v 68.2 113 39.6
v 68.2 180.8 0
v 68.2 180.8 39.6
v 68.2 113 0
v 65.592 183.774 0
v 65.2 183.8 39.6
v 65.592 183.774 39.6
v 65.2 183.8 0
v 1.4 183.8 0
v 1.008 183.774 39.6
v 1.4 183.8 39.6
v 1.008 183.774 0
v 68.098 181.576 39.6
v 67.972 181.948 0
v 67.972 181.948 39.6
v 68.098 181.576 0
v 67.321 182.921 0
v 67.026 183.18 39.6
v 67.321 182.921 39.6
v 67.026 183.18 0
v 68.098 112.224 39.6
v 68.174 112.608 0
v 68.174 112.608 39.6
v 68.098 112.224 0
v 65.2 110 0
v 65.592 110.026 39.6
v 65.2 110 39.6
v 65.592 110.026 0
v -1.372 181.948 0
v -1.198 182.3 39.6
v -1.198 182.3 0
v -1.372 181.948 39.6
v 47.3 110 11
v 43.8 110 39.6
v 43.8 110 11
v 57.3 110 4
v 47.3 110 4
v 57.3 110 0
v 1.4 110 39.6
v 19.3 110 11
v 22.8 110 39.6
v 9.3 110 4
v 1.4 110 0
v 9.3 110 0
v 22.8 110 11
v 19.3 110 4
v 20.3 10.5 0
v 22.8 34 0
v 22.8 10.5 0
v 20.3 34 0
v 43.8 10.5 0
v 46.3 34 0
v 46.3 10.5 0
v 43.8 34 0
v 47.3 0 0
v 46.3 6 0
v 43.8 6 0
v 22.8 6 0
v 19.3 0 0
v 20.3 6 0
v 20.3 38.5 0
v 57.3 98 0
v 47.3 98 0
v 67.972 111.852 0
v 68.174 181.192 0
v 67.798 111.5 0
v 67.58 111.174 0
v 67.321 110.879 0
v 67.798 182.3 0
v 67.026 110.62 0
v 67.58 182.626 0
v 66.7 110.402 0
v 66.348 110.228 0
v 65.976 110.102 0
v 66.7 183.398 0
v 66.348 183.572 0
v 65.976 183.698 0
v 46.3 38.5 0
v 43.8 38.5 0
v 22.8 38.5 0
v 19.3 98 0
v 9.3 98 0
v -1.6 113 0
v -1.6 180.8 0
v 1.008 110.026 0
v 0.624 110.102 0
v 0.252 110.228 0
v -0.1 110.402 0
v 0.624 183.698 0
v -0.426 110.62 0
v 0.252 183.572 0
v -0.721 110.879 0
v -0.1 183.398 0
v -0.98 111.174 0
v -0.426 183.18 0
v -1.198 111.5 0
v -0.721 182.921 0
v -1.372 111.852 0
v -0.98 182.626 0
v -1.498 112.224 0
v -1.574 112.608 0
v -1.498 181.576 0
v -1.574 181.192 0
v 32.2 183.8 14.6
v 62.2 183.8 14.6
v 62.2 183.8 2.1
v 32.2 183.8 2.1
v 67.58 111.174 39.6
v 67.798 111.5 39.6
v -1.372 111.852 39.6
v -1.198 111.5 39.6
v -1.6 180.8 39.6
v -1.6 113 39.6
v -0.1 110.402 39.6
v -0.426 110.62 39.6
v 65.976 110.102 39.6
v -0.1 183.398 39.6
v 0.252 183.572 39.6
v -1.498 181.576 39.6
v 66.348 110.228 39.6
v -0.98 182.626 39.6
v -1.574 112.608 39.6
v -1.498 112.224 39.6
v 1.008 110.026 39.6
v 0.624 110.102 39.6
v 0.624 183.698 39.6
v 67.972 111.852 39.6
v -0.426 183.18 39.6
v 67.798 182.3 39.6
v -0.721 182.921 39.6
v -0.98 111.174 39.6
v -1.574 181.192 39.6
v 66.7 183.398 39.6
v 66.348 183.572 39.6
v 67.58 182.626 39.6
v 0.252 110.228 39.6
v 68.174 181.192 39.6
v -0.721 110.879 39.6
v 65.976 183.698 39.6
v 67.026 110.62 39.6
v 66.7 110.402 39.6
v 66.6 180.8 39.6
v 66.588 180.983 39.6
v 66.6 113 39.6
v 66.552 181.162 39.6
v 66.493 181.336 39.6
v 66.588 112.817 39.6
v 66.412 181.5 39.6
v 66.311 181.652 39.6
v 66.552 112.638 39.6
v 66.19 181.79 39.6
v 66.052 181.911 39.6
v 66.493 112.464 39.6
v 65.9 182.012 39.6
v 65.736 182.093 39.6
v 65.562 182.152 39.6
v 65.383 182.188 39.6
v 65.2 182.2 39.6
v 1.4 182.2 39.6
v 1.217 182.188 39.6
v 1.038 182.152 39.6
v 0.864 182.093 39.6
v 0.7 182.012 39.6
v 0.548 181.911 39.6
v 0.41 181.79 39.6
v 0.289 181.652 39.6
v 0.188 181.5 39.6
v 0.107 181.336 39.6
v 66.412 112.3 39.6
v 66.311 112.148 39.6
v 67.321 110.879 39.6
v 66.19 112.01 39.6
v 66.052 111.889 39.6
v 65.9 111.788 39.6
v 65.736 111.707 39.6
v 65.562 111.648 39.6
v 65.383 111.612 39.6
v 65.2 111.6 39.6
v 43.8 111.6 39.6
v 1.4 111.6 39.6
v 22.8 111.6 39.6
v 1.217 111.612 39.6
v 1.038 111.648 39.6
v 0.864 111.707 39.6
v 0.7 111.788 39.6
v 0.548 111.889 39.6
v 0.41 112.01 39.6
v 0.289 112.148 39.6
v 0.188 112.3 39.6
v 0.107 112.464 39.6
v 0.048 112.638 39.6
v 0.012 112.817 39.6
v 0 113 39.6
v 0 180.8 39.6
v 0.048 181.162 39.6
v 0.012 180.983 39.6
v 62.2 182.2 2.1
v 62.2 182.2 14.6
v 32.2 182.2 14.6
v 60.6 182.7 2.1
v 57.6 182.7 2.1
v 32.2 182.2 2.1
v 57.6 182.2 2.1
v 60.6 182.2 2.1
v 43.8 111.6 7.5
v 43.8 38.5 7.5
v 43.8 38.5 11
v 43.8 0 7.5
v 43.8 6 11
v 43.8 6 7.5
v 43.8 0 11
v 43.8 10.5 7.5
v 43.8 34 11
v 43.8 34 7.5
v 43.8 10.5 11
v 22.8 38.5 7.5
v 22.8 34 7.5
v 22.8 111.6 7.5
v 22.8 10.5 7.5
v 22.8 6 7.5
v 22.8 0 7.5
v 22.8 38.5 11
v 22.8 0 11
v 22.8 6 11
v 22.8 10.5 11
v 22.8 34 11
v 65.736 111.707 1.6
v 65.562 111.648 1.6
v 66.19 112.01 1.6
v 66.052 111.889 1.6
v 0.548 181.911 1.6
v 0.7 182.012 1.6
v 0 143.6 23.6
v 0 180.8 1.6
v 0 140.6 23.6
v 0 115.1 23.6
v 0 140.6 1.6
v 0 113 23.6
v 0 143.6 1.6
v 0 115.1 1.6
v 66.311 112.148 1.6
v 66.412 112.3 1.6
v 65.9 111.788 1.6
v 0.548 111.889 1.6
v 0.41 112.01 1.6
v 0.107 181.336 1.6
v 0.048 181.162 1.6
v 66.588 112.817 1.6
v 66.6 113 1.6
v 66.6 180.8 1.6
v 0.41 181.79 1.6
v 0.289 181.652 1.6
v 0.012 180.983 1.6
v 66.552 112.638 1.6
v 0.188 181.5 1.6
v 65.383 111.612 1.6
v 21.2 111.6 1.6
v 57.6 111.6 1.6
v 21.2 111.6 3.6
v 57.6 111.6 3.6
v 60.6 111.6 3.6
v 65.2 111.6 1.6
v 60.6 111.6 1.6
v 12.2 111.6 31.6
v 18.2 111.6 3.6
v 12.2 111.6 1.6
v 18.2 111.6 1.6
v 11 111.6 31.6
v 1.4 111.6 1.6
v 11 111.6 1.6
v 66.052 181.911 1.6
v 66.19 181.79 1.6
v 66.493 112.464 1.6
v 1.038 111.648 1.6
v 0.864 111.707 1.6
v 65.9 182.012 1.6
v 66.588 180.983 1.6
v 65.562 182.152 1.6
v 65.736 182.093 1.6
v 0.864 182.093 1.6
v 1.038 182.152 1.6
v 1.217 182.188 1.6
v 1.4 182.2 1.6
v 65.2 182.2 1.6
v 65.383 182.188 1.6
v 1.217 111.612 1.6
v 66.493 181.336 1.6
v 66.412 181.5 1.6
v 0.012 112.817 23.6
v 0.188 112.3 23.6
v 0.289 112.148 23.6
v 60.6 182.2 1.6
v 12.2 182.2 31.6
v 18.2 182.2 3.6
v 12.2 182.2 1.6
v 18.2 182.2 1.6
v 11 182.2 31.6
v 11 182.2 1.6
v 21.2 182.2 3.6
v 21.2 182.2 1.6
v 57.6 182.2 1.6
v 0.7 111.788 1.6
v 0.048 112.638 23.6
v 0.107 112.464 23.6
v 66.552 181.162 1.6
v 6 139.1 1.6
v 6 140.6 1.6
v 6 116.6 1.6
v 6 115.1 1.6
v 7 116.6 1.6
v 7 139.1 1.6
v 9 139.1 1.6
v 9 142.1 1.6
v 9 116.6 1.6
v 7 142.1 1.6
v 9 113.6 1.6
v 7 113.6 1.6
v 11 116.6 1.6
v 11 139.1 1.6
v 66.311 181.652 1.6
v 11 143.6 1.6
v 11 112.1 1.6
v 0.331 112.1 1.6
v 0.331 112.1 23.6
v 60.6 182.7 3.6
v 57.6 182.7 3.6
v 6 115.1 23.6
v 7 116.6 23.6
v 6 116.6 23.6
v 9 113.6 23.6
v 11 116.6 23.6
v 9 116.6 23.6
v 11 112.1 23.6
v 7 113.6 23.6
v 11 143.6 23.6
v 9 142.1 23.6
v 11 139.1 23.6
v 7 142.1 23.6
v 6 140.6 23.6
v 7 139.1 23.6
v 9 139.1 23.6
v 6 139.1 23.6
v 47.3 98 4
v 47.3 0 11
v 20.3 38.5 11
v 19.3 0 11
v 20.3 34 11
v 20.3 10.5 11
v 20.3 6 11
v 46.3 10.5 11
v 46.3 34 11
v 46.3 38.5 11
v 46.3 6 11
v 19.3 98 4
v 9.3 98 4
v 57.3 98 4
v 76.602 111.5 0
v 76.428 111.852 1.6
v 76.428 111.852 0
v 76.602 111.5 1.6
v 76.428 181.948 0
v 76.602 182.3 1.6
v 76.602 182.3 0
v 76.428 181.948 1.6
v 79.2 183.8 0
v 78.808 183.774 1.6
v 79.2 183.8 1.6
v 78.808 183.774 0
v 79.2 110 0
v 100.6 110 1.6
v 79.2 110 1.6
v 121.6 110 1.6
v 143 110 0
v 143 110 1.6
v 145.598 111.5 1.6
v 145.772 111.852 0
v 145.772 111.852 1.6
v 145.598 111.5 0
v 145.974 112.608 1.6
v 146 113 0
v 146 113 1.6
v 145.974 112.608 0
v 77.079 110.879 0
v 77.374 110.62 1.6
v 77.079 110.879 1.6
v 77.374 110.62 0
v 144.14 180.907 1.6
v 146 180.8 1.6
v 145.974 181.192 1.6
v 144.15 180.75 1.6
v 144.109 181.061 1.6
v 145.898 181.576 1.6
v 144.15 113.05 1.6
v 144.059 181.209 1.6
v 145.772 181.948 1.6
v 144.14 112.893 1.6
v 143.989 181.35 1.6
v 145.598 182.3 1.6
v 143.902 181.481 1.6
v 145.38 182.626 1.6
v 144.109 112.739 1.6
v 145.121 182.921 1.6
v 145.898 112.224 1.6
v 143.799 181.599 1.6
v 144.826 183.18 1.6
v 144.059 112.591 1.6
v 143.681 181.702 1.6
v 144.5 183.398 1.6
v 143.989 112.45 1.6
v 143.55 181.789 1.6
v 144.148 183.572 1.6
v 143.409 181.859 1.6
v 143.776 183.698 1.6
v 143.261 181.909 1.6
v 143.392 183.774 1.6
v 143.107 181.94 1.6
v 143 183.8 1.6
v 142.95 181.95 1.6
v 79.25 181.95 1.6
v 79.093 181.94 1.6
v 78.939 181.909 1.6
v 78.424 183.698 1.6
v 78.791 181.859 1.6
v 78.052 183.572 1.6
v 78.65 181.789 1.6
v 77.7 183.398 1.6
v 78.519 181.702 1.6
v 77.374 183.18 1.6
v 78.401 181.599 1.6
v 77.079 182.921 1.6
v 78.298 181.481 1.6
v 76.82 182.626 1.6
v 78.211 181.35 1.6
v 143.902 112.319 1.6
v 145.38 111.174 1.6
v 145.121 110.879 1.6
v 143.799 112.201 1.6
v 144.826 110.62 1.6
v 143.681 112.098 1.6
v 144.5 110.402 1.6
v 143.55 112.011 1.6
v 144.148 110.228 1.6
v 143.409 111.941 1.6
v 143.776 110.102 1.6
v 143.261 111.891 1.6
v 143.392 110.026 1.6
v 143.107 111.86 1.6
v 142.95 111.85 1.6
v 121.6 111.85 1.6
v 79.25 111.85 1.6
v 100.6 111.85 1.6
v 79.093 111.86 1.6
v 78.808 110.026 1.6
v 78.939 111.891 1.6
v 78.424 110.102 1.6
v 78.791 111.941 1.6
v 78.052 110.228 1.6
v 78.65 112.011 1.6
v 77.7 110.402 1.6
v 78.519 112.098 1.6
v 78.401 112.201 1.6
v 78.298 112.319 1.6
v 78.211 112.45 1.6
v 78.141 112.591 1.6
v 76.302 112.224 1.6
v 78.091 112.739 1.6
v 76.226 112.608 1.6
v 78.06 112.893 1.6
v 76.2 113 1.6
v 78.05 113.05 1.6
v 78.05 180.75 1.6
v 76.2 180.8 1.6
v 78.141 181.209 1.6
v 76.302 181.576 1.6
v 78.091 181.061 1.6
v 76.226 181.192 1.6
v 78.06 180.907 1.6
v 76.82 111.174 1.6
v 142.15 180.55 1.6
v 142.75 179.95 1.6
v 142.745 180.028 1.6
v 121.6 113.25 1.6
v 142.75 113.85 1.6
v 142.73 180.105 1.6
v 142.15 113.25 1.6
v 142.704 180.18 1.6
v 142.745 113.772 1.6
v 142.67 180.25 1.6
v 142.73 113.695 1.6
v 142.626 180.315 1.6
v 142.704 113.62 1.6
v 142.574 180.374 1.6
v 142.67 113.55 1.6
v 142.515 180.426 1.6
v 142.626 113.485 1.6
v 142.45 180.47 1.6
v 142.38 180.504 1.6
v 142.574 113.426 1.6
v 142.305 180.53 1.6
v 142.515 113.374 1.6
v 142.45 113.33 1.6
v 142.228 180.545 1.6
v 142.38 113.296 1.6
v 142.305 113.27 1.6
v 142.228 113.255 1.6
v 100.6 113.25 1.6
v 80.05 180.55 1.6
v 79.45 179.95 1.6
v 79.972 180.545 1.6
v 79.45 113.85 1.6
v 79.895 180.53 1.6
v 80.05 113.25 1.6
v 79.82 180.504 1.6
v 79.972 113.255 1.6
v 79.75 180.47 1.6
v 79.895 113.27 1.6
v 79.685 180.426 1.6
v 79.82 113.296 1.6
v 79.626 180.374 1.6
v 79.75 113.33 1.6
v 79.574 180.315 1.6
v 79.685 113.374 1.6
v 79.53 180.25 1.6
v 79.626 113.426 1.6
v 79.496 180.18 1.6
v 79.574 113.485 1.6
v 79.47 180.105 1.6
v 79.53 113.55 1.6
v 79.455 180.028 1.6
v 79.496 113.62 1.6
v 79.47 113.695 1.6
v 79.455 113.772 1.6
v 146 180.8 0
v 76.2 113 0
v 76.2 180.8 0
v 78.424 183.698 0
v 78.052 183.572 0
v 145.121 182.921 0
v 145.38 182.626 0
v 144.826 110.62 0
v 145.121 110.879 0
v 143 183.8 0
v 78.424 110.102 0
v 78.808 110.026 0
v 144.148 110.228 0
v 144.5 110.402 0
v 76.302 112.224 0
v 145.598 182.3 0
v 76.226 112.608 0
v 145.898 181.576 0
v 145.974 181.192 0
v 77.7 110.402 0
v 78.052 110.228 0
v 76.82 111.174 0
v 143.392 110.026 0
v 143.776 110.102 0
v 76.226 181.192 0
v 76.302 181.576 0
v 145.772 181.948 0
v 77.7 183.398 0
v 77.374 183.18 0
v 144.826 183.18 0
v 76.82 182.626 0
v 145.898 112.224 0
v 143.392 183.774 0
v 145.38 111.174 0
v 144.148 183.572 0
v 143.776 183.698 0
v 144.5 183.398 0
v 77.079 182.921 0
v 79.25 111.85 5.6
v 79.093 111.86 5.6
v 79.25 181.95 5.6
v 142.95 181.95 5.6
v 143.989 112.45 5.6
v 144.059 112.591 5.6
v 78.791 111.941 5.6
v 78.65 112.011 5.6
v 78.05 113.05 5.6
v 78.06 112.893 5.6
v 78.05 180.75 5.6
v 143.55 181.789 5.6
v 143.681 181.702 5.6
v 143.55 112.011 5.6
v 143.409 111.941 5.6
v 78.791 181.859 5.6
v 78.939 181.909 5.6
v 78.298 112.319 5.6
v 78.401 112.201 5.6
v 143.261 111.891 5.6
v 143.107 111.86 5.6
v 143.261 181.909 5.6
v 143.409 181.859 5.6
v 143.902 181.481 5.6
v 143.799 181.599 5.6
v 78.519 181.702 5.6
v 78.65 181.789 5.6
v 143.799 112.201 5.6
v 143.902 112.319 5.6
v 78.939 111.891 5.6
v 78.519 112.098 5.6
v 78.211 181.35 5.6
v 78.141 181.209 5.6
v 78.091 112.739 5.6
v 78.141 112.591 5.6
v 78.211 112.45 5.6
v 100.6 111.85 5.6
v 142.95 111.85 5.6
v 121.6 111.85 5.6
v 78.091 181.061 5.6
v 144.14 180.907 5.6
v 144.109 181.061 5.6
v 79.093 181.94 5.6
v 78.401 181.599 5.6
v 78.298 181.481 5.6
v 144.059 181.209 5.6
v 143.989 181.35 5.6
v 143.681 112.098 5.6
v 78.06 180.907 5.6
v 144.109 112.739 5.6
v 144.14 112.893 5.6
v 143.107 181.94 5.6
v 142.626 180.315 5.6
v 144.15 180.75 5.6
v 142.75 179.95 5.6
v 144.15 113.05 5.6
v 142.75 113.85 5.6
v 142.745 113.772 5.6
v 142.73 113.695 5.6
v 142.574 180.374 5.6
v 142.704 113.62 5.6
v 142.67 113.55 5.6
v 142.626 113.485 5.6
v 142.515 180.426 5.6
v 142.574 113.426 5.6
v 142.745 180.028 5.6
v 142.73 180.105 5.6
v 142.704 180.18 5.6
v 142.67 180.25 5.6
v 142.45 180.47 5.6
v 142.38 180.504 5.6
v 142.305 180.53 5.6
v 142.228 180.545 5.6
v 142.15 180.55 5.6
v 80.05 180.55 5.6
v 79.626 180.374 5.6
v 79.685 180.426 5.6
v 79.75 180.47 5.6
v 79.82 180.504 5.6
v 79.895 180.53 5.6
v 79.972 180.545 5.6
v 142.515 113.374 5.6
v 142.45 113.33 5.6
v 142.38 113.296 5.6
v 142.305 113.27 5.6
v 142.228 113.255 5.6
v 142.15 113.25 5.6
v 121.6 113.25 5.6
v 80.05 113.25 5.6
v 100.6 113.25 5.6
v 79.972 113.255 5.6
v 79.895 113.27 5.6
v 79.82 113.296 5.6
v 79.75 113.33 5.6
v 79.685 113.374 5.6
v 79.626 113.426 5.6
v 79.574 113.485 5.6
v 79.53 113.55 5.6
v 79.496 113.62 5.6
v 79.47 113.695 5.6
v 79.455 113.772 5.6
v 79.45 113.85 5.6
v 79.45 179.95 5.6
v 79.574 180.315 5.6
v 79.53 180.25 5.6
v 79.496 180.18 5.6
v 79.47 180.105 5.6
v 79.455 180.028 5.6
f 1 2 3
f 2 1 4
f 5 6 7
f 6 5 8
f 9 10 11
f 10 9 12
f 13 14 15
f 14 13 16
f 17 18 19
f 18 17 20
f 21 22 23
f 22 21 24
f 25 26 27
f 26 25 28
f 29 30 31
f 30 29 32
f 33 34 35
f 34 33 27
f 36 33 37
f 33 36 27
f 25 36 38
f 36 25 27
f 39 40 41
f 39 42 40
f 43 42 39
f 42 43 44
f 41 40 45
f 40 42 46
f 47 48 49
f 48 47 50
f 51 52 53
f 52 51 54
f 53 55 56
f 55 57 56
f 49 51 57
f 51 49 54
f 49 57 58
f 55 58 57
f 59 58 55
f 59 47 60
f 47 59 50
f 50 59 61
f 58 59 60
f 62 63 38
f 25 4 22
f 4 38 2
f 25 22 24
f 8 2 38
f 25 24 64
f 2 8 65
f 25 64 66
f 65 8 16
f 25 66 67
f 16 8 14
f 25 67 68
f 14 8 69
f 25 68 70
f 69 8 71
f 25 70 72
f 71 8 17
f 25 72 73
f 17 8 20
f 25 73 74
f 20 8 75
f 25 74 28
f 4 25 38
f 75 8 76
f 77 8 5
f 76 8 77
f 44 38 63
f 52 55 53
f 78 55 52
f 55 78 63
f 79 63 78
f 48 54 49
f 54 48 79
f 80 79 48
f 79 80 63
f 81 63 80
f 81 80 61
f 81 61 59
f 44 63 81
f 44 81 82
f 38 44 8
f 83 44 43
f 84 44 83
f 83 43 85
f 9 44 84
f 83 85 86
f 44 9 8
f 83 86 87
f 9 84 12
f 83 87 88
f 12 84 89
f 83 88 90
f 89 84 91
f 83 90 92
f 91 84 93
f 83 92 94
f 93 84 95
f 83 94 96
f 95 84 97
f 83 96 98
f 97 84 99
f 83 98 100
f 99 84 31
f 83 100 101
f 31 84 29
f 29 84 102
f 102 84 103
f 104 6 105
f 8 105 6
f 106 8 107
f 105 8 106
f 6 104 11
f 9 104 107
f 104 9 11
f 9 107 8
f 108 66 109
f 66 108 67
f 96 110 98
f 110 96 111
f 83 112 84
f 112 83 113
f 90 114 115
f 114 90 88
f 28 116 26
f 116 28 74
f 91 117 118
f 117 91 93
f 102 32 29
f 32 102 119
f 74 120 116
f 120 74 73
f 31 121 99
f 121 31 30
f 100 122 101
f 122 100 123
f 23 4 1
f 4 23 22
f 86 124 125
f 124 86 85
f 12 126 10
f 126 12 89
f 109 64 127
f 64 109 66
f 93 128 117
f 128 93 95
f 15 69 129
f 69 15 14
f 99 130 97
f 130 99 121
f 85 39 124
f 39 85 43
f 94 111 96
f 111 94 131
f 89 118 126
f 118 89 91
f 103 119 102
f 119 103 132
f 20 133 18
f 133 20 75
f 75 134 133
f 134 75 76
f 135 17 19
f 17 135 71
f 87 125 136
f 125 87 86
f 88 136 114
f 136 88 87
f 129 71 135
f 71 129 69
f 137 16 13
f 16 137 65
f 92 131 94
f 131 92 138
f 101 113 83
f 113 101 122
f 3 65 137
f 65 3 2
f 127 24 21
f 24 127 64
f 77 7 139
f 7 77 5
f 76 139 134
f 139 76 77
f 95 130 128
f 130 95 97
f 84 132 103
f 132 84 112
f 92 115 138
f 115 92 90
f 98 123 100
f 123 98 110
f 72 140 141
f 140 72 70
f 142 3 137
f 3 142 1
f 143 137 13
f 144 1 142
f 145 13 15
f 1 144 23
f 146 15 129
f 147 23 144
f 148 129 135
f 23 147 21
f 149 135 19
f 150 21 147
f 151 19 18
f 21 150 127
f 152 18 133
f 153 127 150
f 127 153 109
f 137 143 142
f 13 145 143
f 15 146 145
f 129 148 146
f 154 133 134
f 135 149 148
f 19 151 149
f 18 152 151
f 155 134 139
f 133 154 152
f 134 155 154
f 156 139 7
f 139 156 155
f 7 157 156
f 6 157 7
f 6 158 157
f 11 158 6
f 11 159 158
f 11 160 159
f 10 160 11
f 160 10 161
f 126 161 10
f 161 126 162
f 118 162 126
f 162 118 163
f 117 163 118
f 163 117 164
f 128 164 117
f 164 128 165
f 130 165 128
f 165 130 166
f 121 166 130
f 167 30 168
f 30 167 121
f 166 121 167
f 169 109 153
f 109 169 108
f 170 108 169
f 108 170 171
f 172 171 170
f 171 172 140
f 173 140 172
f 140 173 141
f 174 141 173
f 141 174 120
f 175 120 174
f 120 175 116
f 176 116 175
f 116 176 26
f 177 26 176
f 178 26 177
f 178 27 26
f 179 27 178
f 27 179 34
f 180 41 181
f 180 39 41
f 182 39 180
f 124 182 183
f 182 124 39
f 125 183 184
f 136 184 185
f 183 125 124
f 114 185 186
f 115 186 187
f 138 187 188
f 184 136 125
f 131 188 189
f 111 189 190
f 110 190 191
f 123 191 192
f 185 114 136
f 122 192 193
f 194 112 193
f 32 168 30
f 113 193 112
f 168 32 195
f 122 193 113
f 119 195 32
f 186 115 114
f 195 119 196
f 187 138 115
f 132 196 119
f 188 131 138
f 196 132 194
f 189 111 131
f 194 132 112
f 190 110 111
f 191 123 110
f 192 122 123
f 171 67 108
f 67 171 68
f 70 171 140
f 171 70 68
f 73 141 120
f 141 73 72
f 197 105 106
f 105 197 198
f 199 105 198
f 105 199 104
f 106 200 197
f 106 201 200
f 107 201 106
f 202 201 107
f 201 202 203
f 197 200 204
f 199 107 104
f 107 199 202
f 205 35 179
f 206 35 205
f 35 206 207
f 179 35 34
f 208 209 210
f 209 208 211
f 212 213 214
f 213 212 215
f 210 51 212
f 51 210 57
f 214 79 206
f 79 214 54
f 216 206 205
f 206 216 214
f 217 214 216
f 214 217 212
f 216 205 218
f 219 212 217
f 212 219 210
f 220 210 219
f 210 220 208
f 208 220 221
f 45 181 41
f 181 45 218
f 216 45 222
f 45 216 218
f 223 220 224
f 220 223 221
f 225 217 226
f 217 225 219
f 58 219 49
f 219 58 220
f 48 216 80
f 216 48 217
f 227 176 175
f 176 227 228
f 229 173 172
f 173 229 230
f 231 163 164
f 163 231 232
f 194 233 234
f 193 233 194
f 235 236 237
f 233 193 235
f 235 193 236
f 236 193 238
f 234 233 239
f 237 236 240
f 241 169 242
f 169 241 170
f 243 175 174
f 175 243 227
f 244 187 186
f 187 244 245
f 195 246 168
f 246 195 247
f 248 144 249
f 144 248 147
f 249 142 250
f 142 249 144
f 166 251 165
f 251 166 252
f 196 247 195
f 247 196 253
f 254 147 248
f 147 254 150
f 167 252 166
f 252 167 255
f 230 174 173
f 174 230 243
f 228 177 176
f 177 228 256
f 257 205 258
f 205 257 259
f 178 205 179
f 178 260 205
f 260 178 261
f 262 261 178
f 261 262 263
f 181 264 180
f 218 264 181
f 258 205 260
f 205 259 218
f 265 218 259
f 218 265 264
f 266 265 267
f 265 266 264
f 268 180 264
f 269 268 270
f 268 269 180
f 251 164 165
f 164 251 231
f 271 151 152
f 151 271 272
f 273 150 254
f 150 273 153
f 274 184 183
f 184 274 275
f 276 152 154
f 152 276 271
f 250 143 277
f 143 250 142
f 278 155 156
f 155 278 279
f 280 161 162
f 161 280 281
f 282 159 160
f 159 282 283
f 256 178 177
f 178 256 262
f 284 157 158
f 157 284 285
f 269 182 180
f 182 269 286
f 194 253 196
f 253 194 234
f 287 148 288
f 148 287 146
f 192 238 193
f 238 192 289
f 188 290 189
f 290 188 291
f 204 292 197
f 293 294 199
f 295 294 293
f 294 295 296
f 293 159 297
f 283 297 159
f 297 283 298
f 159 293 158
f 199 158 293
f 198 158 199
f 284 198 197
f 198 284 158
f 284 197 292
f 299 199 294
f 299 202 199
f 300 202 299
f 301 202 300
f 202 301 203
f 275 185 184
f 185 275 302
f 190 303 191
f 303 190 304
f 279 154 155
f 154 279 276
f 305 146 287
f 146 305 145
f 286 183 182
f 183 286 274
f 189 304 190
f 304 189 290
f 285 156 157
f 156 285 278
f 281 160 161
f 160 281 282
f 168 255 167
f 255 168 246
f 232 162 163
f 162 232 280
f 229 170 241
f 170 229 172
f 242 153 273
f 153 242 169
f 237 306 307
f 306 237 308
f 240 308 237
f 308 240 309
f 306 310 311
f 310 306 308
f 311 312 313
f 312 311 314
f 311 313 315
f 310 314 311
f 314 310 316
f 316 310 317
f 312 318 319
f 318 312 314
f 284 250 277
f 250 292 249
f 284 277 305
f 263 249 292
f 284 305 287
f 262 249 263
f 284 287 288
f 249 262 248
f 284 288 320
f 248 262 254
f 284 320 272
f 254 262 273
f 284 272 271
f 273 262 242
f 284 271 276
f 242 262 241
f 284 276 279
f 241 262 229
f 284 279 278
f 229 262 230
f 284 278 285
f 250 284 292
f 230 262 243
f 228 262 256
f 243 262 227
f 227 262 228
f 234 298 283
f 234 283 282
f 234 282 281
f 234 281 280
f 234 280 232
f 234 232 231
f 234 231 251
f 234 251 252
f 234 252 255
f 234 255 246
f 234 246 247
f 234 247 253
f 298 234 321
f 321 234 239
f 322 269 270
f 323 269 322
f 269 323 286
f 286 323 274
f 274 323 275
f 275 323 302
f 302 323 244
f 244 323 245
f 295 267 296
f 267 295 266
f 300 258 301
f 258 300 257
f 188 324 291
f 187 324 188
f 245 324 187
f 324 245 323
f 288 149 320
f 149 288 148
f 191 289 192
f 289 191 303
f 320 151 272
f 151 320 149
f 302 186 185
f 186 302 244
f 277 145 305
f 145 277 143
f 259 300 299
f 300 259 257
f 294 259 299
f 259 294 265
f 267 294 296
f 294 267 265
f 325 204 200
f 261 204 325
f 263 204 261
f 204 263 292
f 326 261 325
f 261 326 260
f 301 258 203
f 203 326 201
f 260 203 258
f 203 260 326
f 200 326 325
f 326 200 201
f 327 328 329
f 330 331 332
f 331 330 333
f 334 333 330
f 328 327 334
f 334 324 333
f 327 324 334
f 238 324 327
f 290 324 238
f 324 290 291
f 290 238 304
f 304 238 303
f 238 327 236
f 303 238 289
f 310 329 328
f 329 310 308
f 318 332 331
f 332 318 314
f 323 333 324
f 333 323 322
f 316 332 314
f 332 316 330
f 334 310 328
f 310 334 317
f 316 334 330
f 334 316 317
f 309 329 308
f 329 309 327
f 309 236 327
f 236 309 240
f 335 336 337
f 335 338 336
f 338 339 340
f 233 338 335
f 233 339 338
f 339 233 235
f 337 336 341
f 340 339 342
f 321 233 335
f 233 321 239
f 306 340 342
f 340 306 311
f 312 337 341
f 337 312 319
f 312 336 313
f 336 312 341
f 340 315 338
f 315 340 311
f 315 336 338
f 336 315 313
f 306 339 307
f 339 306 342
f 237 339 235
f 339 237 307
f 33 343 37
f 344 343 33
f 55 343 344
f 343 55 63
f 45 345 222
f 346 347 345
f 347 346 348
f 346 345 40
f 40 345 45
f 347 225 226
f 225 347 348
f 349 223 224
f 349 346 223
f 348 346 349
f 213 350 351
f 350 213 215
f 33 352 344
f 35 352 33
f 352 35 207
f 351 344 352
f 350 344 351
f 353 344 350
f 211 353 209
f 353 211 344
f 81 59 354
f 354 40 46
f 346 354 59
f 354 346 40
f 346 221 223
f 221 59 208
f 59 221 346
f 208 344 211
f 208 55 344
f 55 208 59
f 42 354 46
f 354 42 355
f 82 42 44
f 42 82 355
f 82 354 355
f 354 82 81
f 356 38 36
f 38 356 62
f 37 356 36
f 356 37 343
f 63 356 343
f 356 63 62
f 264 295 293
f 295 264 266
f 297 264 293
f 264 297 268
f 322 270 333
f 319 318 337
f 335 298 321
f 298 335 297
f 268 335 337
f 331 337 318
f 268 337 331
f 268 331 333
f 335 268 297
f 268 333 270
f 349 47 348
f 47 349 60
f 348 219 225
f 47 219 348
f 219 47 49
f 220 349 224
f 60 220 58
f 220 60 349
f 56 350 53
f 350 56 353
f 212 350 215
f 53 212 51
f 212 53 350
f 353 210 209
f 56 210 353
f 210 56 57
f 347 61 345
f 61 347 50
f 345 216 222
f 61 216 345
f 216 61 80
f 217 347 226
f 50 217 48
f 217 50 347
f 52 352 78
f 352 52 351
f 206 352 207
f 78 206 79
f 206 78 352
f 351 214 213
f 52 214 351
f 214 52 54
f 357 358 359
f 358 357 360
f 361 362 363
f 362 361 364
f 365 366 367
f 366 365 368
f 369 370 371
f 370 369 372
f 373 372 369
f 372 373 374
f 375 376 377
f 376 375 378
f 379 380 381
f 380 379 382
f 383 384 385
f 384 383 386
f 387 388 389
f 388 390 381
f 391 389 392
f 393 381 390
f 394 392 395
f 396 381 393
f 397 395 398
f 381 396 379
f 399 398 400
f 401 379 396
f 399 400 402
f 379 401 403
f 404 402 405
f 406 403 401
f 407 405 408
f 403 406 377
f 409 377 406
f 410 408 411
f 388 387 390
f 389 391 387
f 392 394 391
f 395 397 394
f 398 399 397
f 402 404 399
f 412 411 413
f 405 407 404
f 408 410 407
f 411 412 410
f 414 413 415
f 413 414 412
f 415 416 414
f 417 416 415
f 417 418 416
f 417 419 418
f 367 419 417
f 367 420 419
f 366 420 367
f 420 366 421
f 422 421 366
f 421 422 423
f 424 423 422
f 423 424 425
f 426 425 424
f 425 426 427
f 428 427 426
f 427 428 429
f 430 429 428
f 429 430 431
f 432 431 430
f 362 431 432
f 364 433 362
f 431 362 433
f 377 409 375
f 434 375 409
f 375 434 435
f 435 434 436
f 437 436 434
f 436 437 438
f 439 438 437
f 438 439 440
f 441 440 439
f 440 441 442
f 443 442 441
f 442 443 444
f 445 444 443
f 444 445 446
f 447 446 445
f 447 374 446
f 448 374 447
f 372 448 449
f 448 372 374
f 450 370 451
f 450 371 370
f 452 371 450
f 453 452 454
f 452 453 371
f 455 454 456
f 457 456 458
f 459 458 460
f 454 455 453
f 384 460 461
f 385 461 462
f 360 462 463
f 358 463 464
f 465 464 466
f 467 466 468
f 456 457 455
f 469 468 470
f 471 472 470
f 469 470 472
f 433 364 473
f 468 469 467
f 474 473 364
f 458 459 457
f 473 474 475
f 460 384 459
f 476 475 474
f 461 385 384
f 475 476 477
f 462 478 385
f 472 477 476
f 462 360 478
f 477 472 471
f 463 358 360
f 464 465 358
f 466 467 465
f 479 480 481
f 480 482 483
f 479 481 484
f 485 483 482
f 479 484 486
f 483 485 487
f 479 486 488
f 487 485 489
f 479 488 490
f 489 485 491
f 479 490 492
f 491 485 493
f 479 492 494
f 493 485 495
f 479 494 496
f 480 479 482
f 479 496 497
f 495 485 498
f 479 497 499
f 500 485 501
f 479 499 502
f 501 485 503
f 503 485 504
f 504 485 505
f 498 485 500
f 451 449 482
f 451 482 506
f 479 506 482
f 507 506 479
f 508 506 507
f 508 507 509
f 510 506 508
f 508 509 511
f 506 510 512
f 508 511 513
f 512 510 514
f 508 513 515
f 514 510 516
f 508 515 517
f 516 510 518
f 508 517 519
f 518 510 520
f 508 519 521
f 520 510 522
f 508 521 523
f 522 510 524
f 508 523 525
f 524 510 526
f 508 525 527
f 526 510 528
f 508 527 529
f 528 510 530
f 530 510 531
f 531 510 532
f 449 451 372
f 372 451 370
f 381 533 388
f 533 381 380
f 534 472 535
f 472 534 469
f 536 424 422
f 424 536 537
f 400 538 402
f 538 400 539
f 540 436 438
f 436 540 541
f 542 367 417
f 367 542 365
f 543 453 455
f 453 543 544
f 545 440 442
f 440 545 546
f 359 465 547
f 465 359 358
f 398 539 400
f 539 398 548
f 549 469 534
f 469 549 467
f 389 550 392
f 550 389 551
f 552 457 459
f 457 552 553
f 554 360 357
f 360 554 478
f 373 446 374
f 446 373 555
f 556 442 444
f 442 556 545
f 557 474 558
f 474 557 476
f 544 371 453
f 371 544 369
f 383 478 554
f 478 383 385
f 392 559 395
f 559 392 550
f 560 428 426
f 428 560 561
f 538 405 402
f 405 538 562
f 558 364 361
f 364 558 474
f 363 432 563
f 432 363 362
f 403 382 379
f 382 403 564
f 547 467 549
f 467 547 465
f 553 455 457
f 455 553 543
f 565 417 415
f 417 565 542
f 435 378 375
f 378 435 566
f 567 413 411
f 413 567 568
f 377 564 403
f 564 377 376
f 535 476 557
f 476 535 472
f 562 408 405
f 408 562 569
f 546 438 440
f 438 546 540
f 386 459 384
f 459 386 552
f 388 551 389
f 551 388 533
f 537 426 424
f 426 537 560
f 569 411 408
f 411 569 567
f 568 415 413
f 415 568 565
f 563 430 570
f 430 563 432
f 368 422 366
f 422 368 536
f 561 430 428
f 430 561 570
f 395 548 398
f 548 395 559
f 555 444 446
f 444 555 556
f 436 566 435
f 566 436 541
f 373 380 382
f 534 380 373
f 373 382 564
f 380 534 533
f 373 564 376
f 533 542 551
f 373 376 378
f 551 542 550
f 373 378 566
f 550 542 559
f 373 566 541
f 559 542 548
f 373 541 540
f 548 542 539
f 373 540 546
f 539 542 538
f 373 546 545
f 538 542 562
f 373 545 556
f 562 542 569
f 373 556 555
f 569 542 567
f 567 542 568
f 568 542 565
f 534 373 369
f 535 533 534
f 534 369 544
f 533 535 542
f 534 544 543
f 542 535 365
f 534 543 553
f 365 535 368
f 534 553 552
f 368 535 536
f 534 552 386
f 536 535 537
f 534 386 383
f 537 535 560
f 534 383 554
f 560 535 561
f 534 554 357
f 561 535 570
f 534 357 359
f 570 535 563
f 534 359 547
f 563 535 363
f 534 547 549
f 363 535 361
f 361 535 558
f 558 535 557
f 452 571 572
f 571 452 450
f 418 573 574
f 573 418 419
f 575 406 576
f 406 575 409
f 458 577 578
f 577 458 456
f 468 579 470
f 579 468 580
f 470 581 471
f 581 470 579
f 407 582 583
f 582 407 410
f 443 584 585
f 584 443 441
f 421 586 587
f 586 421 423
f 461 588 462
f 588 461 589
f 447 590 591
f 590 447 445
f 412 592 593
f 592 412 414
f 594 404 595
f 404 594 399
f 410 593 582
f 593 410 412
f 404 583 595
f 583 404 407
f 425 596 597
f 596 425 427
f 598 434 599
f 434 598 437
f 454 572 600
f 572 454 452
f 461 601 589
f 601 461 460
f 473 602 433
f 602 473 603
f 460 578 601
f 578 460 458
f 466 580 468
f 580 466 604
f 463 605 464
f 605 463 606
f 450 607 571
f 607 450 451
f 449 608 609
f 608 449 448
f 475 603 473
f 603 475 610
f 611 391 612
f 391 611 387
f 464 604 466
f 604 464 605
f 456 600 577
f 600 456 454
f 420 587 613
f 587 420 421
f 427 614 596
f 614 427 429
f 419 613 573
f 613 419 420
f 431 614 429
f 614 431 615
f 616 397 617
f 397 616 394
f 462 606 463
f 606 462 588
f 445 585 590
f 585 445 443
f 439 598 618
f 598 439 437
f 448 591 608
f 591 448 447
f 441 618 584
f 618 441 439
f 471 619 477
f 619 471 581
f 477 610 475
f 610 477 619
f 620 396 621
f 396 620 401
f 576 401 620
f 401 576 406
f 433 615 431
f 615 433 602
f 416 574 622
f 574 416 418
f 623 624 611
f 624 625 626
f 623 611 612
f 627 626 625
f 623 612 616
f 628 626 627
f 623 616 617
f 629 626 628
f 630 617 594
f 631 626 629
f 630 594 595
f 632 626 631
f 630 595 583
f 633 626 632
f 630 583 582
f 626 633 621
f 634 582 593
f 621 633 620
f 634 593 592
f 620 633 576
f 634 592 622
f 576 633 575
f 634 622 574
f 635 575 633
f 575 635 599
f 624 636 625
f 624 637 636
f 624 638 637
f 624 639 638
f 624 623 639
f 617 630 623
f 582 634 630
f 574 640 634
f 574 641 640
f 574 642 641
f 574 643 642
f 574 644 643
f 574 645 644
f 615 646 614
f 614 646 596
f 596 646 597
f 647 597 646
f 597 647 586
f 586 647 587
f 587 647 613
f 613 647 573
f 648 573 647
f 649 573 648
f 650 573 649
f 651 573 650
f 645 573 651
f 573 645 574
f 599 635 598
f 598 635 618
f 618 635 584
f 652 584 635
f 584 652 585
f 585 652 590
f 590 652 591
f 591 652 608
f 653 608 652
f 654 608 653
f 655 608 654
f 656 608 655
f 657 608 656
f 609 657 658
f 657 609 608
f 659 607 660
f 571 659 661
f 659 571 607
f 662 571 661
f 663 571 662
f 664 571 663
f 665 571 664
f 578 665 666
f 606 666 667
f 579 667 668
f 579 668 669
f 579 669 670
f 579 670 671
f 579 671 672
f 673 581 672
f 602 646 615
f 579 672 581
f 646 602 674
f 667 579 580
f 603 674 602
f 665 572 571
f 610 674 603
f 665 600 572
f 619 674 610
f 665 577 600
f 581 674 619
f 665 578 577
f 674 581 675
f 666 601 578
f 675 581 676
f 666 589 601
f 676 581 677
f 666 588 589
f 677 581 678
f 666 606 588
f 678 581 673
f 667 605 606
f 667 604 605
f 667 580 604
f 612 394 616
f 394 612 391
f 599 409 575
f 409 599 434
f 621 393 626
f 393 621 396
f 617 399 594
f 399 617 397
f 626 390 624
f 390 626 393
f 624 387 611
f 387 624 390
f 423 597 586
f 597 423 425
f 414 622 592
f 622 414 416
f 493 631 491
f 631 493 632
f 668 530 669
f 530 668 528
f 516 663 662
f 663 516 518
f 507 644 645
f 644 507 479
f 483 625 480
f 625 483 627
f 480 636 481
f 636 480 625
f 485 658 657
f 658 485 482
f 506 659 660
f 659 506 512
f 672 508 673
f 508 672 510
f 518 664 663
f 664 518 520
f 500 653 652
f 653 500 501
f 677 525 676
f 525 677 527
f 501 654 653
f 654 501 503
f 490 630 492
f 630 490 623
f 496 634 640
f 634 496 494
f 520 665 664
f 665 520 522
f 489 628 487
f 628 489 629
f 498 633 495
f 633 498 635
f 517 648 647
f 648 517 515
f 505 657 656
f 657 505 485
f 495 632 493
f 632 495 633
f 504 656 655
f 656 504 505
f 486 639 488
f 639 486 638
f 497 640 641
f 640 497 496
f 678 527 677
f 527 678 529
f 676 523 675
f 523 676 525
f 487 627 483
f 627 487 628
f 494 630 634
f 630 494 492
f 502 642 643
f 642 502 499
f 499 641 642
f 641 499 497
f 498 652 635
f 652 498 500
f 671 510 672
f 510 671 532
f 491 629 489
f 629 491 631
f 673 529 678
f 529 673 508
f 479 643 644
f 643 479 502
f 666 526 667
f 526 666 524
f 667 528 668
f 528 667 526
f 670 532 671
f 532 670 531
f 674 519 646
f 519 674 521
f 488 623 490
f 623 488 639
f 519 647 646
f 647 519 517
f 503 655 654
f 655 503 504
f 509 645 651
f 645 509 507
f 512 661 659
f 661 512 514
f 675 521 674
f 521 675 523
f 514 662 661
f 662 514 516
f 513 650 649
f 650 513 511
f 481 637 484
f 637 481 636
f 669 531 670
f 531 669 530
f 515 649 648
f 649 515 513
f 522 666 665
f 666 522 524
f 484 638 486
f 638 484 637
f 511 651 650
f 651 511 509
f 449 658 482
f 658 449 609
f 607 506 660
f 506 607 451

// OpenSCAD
// SlopeCast stake enclosure
// Upright stake: moisture sensor clamped in a groove at the bottom of the shaft, Uno (+ Grove
// Base Shield) in a housing held off the ground, Grove accelerometer in a slot on the
// housing's inside wall. Prints lying on its back with no supports.
//
// Coordinates as printed: x across, y along the stake (y = 0 is the tip), z up from the bed.
// Units: mm. Change the measured values below, then F6 and File > Export > STL.
// Set PART to "stake", "lid" or "plate" (both, side by side) before exporting.
//
// Mirrors the Python generator used to make hardware/stl/*.stl; keep the two in step
// (see print-notes.md).

PART = "plate";
$fn = 48;

// ---------- measured parts (edit these)
UNO_W = 54.4;          // pocket width: stock Uno PCB is 53.4 (set 51.0 if yours really is 50)
UNO_L = 70.6;          // pocket length along the stake: PCB 68.6 + USB-C + clearance
UNO_RIB_H = 2.0;       // ribs keep solder pins off the back plate
ACC_L = 25.0;          // accelerometer edge along the stake
ACC_D = 20.0;          // accelerometer edge that slides in toward the back plate
ACC_CLEAR = 0.5;       // play along ACC_L
SENSOR_W = 20.0;       // moisture sensor PCB width

// ---------- walls and fits
W = 1.6;               // wall
BACK = 1.6;            // back plate (on the bed)
GROOVE_W = 2.0;        // accelerometer PCB groove: 1.6 mm board + 0.4
GROOVE_X = 7.0;        // groove distance from the side wall (room for the Grove connector)
GROOVE_DEPTH = 1.5;    // how far each board edge sits in its rail
COMP_W = 11.0;         // accelerometer compartment width
DIV_T = 1.2;           // divider between compartment and Uno pocket
IN_Z = 38.0;           // housing inside depth: Uno 25 + Grove plugs
SHAFT_L = 110.0;       // tip to housing
SHAFT_W = 28.0;
SHAFT_T = 11.0;
GROOVE_SW = SENSOR_W + 1.0;   // sensor groove width (also carries the Grove cable)
GROOVE_SD = 3.5;              // sensor groove depth
USB_X0 = 20.0; USB_X1 = 50.0; // USB-C opening, from the board's left edge (USB edge up)
USB_Z0 = 0.5;  USB_Z1 = 13.0; // above the inside of the back plate
LID_T = 1.6; LIP_H = 4.0; LIP_W = 1.4; LID_CLEAR = 0.25;

// ---------- derived
IN_X = COMP_W + DIV_T + UNO_W;
IN_Y = UNO_L;
HX0 = 0; HY0 = SHAFT_L + W; HZ0 = BACK;
OX0 = HX0 - W; OX1 = HX0 + IN_X + W;
OY0 = SHAFT_L; OY1 = HY0 + IN_Y + W;
OZ1 = HZ0 + IN_Z;
CX = (OX0 + OX1) / 2;
UNO_X0 = HX0 + COMP_W + DIV_T;

module box(x0, y0, z0, x1, y1, z1) {
    translate([x0, y0, z0]) cube([x1 - x0, y1 - y0, z1 - z0]);
}

module rbox(x0, y0, z0, x1, y1, z1, r) {
    hull() for (x = [x0 + r, x1 - r], y = [y0 + r, y1 - r])
        translate([x, y, z0]) cylinder(r = r, h = z1 - z0);
}

module accel_rails() {
    ya = HY0 + 3.5;                    // lower board edge
    yb = ya + ACC_L + ACC_CLEAR;       // upper board edge
    gx0 = HX0 + GROOVE_X; gx1 = gx0 + GROOVE_W;
    rz1 = HZ0 + ACC_D + 2;
    difference() {
        box(HX0 - 0.5, ya - 3, HZ0 - 0.5, HX0 + COMP_W + 0.5, ya + GROOVE_DEPTH, rz1);
        box(gx0, ya - GROOVE_DEPTH, HZ0, gx1, ya + GROOVE_DEPTH + 1, rz1 + 1);
        box(HX0 - 1, ya, HZ0, gx0 - 1.0, ya + GROOVE_DEPTH + 1, rz1 + 1);
    }
    difference() {
        box(HX0 - 0.5, yb - GROOVE_DEPTH, HZ0 - 0.5, HX0 + COMP_W + 0.5, yb + 3, rz1);
        box(gx0, yb - GROOVE_DEPTH - 1, HZ0, gx1, yb + GROOVE_DEPTH, rz1 + 1);
        box(HX0 - 1, yb - GROOVE_DEPTH - 1, HZ0, gx0 - 1.0, yb, rz1 + 1);
    }
}

module stake() {
    difference() {
        union() {
            // housing shell with USB-C opening (top wall) and cable notch (floor, open to the front)
            difference() {
                rbox(OX0, OY0, 0, OX1, OY1, OZ1, 3.0);
                box(UNO_X0 + USB_X0, OY1 - W - 1, HZ0 + USB_Z0, UNO_X0 + USB_X1, OY1 + 1, HZ0 + USB_Z1);
                box(CX - GROOVE_SW / 2, OY0 - 1, SHAFT_T - GROOVE_SD, CX + GROOVE_SW / 2, HY0 + 1, OZ1 + 1);
                rbox(HX0, HY0, HZ0, HX0 + IN_X, HY0 + IN_Y, OZ1 + 1, 1.4);
            }
            // shaft, overlapping into the housing floor
            box(CX - SHAFT_W / 2, 0, 0, CX + SHAFT_W / 2, OY0 + W * 0.5, SHAFT_T);
            // gussets where shaft meets housing
            box(CX - SHAFT_W / 2 - 10, OY0 - 12, 0, CX - SHAFT_W / 2, OY0 + 0.5, 4);
            box(CX + SHAFT_W / 2, OY0 - 12, 0, CX + SHAFT_W / 2 + 10, OY0 + 0.5, 4);
            // divider between accelerometer compartment and Uno pocket
            box(HX0 + COMP_W, HY0 - 0.5, HZ0 - 0.5, HX0 + COMP_W + DIV_T, HY0 + IN_Y + 0.5, HZ0 + 30);
            // ribs under the Uno
            for (rx = [UNO_X0 + 6, UNO_X0 + UNO_W - 9])
                box(rx, HY0 - 0.5, HZ0 - 0.5, rx + 3, HY0 + IN_Y + 0.5, HZ0 + UNO_RIB_H);
            accel_rails();
        }
        // sensor + cable groove down the front of the shaft
        box(CX - GROOVE_SW / 2, -1, SHAFT_T - GROOVE_SD, CX + GROOVE_SW / 2, OY0 + W + 0.1, SHAFT_T + 1);
        // zip-tie slots either side of the sensor
        for (zy = [6, 34], zx = [CX - SHAFT_W / 2 + 1.0, CX + SHAFT_W / 2 - 3.5])
            box(zx, zy, -1, zx + 2.5, zy + 4.5, SHAFT_T + 1);
    }
}

module lid() {
    w = OX1 - OX0; h = OY1 - OY0; c = LID_CLEAR;
    difference() {
        union() {
            rbox(0, 0, 0, w, h, LID_T, 3.0);
            rbox(W + c, W + c, LID_T - 0.1, w - W - c, h - W - c, LID_T + LIP_H, 1.2);
        }
        rbox(W + c + LIP_W, W + c + LIP_W, LID_T, w - W - c - LIP_W, h - W - c - LIP_W, LID_T + LIP_H + 1, 0.6);
        // gap in the lip over the cable notch
        box(w / 2 - GROOVE_SW / 2, -1, LID_T, w / 2 + GROOVE_SW / 2, W + c + LIP_W + 1, LID_T + LIP_H + 1);
    }
}

if (PART == "stake") stake();
else if (PART == "lid") lid();
else { stake(); translate([OX1 + 8, OY0, 0]) lid(); }
